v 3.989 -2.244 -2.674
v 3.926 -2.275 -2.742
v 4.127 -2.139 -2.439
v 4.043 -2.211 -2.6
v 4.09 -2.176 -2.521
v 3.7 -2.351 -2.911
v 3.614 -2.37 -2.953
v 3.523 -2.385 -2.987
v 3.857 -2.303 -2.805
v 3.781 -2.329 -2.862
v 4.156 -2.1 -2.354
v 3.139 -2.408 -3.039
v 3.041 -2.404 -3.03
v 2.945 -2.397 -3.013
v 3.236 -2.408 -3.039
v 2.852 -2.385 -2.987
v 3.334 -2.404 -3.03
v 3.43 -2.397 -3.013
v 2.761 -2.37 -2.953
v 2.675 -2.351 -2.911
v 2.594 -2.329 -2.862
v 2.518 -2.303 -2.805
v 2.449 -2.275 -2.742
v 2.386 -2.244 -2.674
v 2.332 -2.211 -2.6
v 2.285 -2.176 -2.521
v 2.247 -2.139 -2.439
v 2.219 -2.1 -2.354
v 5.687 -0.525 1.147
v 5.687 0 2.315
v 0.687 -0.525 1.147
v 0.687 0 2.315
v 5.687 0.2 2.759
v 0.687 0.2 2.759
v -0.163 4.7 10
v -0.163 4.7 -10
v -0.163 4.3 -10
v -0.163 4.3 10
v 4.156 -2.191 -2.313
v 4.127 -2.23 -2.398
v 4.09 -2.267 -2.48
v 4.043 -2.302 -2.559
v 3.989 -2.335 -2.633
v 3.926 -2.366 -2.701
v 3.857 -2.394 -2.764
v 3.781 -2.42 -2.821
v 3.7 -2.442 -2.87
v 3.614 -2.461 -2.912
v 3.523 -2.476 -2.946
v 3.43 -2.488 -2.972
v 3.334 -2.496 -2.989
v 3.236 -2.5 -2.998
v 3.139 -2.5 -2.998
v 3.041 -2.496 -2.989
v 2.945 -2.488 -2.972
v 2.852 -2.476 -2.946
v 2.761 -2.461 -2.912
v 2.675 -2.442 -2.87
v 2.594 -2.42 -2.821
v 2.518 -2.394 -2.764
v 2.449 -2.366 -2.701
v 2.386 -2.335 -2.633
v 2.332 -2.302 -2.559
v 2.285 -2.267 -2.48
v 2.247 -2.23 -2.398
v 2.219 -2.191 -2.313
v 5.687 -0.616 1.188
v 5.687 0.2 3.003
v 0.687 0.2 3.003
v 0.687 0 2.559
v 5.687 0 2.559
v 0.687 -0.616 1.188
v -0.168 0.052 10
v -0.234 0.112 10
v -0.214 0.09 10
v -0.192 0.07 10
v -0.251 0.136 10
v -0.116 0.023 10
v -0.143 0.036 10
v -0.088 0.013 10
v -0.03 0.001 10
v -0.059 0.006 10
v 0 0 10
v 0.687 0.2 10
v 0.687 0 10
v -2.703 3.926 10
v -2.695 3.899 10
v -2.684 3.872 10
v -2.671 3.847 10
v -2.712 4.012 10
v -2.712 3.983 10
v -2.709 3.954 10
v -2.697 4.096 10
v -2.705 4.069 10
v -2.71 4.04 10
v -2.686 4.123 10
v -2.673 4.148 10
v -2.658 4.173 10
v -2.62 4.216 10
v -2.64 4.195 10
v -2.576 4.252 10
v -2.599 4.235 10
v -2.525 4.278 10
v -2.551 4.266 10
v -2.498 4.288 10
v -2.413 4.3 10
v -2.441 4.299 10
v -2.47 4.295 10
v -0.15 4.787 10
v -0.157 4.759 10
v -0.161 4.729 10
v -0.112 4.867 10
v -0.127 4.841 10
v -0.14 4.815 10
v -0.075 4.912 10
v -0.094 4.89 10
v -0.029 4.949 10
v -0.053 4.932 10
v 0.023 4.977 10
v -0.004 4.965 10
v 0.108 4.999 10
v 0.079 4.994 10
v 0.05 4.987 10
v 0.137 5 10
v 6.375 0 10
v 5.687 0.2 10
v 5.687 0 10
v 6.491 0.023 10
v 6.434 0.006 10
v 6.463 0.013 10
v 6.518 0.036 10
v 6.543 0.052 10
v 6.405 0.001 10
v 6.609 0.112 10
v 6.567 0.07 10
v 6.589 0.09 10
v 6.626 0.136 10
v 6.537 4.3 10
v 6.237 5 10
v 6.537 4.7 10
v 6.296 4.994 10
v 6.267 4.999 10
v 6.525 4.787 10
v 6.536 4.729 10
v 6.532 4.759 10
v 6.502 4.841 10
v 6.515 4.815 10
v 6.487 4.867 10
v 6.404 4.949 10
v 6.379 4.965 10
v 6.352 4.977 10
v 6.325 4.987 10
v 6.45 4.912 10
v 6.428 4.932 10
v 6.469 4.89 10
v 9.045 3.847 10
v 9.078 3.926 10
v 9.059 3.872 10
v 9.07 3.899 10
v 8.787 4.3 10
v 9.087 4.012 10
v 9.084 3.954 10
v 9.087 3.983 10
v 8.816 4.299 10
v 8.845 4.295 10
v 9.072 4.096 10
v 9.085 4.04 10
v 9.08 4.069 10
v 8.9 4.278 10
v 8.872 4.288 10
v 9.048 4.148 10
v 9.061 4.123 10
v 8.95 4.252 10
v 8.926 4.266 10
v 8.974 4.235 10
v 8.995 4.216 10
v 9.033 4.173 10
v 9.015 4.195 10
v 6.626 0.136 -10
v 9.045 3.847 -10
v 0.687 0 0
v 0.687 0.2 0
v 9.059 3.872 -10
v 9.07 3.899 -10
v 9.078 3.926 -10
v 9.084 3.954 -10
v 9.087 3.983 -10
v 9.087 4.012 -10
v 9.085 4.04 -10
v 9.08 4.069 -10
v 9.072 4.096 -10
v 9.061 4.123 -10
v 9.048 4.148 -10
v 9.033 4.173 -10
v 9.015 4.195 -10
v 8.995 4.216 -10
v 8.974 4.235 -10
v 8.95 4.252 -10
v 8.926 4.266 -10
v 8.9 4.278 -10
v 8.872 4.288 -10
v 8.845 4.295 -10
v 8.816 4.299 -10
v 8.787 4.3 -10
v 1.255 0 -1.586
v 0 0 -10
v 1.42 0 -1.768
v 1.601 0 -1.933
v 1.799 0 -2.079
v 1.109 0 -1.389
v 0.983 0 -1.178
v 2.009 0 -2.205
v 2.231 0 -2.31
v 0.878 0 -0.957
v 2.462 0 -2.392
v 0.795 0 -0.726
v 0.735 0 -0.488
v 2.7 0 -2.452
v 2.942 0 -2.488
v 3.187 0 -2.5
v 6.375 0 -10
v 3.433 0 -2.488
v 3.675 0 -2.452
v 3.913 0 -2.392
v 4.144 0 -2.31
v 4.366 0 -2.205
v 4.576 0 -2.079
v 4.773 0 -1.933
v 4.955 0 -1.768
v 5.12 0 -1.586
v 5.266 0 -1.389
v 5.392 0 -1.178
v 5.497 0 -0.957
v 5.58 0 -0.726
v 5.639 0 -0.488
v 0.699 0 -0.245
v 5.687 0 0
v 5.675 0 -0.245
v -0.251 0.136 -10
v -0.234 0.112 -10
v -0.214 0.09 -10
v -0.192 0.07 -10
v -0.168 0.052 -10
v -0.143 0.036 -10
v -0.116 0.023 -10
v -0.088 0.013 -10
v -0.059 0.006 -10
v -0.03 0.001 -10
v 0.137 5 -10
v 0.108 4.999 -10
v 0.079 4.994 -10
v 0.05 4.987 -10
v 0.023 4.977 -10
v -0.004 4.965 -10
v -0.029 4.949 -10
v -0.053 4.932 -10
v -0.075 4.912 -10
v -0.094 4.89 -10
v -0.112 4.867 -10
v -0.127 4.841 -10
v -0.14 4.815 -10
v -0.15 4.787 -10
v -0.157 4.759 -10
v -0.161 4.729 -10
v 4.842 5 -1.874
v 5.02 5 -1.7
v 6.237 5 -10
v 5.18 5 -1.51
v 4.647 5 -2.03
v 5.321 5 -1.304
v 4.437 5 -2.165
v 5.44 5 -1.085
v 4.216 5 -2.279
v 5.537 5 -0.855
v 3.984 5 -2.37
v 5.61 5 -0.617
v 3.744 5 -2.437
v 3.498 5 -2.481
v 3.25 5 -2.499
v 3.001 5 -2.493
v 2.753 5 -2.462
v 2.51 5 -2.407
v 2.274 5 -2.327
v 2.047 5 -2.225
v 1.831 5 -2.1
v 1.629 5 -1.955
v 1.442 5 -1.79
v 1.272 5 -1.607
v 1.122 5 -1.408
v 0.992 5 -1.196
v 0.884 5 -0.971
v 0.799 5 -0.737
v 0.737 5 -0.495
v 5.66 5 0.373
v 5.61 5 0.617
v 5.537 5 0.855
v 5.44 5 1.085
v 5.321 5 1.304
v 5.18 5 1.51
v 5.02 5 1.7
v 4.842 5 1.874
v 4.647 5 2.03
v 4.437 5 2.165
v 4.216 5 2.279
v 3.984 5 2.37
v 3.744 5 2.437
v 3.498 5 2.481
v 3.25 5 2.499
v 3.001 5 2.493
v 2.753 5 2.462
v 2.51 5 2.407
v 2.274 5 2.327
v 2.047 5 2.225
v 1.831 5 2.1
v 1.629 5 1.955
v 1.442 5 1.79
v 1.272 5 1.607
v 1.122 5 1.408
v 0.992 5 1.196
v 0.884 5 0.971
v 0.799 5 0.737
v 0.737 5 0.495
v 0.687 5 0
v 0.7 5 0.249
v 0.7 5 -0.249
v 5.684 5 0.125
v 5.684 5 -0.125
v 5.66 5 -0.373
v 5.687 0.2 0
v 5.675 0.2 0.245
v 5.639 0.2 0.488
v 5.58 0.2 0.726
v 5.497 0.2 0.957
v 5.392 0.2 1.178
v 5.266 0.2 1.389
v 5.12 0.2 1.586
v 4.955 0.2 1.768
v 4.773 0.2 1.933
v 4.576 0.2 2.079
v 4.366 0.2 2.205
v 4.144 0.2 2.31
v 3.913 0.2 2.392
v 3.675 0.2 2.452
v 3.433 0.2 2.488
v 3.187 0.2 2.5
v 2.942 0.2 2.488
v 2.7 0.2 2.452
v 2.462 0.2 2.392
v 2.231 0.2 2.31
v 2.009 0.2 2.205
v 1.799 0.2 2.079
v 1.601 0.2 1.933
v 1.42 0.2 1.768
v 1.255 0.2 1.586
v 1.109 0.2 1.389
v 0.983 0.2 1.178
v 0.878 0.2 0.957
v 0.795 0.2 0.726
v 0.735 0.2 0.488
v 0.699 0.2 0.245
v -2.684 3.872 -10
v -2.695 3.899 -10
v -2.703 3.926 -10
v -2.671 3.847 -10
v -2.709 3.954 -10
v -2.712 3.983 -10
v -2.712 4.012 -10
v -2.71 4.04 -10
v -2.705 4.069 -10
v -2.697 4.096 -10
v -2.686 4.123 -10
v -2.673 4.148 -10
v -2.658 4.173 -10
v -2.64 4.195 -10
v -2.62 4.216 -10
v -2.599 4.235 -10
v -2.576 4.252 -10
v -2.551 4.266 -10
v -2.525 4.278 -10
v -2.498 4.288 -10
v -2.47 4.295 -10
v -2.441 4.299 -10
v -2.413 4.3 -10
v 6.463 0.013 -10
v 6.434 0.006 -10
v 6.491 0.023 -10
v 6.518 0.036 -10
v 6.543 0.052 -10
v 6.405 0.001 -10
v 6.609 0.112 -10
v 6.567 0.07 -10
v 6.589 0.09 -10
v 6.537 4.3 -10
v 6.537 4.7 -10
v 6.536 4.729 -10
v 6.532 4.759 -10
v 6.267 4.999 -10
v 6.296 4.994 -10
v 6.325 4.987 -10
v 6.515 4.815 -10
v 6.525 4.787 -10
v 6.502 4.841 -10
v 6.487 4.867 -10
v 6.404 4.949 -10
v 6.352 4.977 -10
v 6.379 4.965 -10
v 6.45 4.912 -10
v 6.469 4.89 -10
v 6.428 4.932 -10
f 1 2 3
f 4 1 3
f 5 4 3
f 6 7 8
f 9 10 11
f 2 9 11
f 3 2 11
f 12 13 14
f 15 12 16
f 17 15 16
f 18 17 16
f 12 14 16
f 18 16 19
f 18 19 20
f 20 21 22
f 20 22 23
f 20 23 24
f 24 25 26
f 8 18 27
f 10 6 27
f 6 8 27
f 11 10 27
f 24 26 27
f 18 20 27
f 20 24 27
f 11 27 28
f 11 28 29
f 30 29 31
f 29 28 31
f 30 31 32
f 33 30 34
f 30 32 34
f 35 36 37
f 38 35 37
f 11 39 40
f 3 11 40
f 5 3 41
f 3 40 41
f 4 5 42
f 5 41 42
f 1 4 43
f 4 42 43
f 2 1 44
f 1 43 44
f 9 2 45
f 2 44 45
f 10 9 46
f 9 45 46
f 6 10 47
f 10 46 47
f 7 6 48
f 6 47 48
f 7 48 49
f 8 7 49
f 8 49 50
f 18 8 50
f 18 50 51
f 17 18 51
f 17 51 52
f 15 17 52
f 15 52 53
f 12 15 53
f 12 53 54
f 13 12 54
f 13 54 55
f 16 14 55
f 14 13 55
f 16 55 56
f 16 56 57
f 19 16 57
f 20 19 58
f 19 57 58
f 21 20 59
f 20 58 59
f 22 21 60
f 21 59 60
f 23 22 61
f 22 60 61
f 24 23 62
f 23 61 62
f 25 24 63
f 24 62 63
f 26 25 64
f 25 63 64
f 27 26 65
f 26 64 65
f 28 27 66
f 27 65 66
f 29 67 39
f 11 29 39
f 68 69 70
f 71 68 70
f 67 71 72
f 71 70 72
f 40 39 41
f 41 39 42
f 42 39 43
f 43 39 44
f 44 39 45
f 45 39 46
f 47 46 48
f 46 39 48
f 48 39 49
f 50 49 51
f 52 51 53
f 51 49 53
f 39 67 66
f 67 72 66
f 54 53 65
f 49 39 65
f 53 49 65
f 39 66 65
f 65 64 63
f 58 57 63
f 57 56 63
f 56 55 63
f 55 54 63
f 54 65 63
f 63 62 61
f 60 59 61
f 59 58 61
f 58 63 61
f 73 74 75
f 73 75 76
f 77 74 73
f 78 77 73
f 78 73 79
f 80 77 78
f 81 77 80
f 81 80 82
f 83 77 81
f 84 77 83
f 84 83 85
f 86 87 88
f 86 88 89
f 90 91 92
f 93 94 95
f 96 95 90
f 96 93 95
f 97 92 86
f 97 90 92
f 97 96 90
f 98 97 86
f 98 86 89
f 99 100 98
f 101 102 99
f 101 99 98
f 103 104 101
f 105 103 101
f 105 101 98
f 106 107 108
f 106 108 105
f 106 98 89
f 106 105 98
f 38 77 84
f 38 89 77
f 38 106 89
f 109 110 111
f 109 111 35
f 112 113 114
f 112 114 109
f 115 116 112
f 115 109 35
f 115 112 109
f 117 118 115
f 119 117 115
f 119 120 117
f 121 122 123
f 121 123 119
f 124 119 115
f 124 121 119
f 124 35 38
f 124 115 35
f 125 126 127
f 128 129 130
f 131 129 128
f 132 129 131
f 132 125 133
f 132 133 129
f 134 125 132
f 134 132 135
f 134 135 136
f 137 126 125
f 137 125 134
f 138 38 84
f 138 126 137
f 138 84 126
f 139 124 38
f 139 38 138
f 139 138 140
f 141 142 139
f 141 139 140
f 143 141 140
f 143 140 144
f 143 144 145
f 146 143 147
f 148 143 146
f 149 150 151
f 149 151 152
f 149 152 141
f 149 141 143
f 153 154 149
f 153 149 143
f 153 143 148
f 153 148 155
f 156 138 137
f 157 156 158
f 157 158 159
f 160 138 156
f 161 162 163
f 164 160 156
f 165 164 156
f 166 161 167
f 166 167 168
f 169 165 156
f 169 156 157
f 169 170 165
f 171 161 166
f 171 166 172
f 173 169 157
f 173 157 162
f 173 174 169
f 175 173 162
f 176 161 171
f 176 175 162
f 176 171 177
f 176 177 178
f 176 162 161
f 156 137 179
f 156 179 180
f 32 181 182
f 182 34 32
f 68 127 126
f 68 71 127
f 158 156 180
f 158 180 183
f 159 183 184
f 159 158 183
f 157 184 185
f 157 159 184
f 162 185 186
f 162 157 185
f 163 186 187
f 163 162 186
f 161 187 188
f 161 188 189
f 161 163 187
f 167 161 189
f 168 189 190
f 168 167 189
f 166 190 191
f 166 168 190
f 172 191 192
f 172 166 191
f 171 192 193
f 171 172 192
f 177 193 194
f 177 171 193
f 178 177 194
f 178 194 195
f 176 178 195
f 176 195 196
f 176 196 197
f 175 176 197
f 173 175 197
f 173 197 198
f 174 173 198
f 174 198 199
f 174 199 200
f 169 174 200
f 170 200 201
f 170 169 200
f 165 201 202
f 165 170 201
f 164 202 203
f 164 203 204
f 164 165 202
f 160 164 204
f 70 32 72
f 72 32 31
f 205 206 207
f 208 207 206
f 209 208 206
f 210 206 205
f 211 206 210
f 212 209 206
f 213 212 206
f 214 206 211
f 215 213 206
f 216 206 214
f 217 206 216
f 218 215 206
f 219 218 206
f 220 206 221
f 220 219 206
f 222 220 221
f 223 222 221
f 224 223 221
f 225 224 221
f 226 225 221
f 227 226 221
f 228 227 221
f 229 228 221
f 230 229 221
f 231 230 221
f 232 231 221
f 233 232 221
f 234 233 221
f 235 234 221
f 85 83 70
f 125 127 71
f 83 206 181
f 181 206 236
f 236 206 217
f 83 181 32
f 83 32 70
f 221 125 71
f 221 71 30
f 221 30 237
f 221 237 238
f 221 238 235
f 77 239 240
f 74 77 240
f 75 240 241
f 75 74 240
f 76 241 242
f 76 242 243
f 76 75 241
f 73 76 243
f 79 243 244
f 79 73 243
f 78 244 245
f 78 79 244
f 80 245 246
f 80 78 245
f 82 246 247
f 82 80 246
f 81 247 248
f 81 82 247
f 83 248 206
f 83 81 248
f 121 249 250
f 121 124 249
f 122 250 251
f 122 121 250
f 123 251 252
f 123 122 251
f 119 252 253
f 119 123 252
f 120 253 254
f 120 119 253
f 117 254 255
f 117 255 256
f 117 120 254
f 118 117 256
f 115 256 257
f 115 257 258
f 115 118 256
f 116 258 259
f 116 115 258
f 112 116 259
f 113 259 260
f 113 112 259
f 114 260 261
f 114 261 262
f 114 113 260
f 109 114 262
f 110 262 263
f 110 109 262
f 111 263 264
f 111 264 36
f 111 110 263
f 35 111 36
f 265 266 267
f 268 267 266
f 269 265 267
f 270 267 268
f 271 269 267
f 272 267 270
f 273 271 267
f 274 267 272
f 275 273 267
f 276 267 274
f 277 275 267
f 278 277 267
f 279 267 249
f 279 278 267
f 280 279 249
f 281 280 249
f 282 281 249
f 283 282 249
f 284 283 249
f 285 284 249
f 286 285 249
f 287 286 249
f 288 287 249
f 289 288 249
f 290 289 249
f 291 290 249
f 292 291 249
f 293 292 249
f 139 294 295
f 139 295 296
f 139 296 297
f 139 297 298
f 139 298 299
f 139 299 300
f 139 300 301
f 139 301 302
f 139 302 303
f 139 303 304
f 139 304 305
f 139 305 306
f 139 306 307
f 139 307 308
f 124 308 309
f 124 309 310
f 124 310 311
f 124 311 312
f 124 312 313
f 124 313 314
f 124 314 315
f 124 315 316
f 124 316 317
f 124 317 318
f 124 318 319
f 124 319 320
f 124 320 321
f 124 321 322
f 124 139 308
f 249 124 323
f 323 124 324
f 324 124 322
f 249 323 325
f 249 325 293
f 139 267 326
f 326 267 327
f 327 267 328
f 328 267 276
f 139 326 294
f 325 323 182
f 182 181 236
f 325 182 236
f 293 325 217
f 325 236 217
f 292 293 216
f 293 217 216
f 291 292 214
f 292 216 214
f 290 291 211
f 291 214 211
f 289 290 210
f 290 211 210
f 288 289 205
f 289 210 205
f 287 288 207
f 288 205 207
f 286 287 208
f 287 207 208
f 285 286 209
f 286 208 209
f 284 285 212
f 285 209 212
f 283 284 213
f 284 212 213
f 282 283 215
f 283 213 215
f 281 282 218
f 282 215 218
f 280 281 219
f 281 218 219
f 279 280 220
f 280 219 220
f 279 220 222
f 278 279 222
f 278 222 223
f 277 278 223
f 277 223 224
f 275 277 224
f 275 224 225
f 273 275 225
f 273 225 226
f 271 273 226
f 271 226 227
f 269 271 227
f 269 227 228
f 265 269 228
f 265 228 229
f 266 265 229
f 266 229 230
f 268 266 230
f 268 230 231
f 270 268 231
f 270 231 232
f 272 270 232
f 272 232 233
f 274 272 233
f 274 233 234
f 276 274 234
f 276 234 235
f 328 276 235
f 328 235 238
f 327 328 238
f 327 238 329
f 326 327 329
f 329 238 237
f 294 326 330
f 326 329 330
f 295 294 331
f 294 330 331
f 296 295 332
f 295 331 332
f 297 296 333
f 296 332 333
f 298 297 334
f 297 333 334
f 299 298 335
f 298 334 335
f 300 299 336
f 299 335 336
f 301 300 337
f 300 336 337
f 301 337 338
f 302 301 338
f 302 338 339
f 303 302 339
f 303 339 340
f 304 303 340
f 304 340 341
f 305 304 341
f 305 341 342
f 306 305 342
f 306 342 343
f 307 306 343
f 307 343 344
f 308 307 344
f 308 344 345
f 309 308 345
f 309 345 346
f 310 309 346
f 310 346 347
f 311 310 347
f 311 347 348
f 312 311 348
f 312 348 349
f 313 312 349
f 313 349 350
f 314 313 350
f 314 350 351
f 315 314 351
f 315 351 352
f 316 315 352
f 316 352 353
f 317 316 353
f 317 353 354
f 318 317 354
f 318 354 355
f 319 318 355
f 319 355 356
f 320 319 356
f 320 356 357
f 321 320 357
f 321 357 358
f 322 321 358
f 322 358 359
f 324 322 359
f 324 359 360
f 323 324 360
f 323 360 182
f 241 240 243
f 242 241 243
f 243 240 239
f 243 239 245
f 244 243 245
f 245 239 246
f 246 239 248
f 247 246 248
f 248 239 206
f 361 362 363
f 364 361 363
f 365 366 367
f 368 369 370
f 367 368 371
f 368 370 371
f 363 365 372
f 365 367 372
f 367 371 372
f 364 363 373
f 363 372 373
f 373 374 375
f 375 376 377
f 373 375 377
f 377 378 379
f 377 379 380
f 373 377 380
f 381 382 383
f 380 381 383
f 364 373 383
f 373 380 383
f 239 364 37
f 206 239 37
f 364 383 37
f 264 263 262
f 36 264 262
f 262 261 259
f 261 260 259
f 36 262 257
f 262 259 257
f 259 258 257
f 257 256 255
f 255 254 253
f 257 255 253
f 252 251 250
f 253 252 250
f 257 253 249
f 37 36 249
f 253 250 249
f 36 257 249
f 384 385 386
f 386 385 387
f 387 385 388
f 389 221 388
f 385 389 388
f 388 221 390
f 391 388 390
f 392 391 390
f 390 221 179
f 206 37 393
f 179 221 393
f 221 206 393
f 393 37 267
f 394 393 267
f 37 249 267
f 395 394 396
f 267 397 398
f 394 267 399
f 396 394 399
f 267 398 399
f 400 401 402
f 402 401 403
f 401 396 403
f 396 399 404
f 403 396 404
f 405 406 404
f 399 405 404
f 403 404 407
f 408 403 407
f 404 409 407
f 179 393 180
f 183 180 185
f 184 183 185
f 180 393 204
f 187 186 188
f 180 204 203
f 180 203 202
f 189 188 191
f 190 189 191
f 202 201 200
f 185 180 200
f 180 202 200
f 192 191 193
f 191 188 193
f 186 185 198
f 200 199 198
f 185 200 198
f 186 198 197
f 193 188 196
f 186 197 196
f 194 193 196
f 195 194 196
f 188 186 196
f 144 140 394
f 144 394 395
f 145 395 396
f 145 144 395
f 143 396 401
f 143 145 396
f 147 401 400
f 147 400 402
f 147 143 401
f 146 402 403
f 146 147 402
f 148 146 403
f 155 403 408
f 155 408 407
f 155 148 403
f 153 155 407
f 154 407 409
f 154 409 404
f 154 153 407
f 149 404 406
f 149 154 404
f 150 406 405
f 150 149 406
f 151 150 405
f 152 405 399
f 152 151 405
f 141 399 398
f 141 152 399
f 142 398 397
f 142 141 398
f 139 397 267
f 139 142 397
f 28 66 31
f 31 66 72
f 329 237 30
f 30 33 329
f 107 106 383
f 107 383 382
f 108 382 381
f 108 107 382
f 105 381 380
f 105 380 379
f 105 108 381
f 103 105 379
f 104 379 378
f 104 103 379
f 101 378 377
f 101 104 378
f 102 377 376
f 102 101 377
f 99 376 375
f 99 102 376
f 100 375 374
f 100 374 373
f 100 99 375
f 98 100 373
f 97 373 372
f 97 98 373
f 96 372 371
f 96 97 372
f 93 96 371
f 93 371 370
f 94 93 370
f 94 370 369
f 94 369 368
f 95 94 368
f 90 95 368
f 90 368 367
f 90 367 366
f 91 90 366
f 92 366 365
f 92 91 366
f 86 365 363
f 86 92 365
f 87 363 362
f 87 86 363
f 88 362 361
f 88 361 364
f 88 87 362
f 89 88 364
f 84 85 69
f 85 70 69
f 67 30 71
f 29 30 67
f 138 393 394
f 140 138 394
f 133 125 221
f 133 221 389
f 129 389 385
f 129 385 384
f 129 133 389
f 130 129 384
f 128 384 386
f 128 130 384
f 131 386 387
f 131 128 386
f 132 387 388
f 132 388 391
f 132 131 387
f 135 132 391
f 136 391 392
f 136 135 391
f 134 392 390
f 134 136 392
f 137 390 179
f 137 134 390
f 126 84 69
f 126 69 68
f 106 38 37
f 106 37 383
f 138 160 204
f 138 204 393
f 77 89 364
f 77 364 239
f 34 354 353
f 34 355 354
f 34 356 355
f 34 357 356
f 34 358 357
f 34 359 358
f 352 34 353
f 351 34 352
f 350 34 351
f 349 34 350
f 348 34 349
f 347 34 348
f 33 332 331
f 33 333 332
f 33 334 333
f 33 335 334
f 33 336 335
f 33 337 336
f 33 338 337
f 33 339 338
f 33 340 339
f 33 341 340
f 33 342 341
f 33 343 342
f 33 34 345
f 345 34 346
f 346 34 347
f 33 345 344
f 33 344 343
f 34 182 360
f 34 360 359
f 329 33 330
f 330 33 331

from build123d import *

# Parameters (mm, degrees)
EXTRUDE_1_DEPTH     = 10
HOLE_WIZARD_M6_1_D  = 5
SKETCH_5_W          = 5
SKETCH_5_H          = 0.2
CUT_EXTRUDE_1_DEPTH = 10
EXTRUDE_2_DEPTH     = 2.5
CUT_EXTRUDE_2_DEPTH = 0.3


with BuildPart() as part:
    # 草图1 → 凸台-拉伸1 (new, symmetric)
    with BuildSketch(Plane.XY):
        with BuildLine():
            Line((-0.162539896, 4.7), (-0.162539896, 4.3))
            Line((-0.162539896, 4.3), (-2.412539896, 4.3))
            ThreePointArc((-2.412539896, 4.3), (-2.673218708, 4.148480829), (-2.670578604, 3.846977045))
            Line((-2.670578604, 3.846977045), (-0.251308863, 0.136159055))
            ThreePointArc((-0.251308863, 0.136159055), (-0.142912065, 0.036227102), (0, 0))
            Line((0, 0), (6.374920209, 0))
            ThreePointArc((6.374920209, 0), (6.517832273, 0.036227102), (6.626229072, 0.136159055))
            Line((6.626229072, 0.136159055), (9.045498813, 3.846977045))
            ThreePointArc((9.045498813, 3.846977045), (9.048138917, 4.148480829), (8.787460104, 4.3))
            Line((8.787460104, 4.3), (6.537460104, 4.3))
            Line((6.537460104, 4.3), (6.537460104, 4.7))
            ThreePointArc((6.537460104, 4.7), (6.449592139, 4.912132034), (6.237460104, 5))
            Line((6.237460104, 5), (0.137460104, 5))
            ThreePointArc((0.137460104, 5), (-0.07467193, 4.912132034), (-0.162539896, 4.7))
        make_face()
    extrude(amount=EXTRUDE_1_DEPTH, both=True)

    # M6 螺纹孔1 (through all)
    with Locations(Plane(origin=(3.187460104, 5, 0), x_dir=(1, 0, 0), z_dir=(0, 1, 0))):
        with Locations((0, 0)):
            Hole(HOLE_WIZARD_M6_1_D / 2)

    # 草图5 → 切除-拉伸1 (cut)
    with BuildSketch(Plane.XY.offset(10)):
        with Locations((3.187460104, 0.1)):
            Rectangle(SKETCH_5_W, SKETCH_5_H)
    extrude(amount=-CUT_EXTRUDE_1_DEPTH, mode=Mode.SUBTRACT)

    # 草图6 → 凸台-拉伸2 (add, symmetric)
    with BuildSketch(Plane.ZY.offset(-3.187460104)):
        Polygon((3.00315896, 0.2), (-2.998839756, -2.5), (-3.039864859, -2.408802736), (3.00315896, 0.309652412), align=None)
    extrude(amount=EXTRUDE_2_DEPTH, both=True)

    # 草图7 → 切除-拉伸2 (cut)
    with BuildSketch(Plane(origin=(0, -0.957256199, 0.430621841), x_dir=(1, 0, 0), z_dir=(-1.0372120907131427e-12, -0.9119726400165361, 0.41025102542378794))):
        with BuildLine():
            Line((5.687460104, 0.830780993), (4.156276113, -3.008268608))
            ThreePointArc((4.156276113, -3.008268608), (3.187460104, -3.760487373), (2.218644095, -3.008268608))
            Line((2.218644095, -3.008268608), (0.687460104, 0.830780993))
            Line((0.687460104, 0.830780993), (-4.835906094, -0.220154239))
            Line((-4.835906094, -0.220154239), (4.418162479, -8.671425065))
            Line((4.418162479, -8.671425065), (7.352023336, -1.665190183))
            Line((7.352023336, -1.665190183), (5.687460104, 0.830780993))
        make_face()
    extrude(amount=-CUT_EXTRUDE_2_DEPTH, mode=Mode.SUBTRACT)


solid = part.part
